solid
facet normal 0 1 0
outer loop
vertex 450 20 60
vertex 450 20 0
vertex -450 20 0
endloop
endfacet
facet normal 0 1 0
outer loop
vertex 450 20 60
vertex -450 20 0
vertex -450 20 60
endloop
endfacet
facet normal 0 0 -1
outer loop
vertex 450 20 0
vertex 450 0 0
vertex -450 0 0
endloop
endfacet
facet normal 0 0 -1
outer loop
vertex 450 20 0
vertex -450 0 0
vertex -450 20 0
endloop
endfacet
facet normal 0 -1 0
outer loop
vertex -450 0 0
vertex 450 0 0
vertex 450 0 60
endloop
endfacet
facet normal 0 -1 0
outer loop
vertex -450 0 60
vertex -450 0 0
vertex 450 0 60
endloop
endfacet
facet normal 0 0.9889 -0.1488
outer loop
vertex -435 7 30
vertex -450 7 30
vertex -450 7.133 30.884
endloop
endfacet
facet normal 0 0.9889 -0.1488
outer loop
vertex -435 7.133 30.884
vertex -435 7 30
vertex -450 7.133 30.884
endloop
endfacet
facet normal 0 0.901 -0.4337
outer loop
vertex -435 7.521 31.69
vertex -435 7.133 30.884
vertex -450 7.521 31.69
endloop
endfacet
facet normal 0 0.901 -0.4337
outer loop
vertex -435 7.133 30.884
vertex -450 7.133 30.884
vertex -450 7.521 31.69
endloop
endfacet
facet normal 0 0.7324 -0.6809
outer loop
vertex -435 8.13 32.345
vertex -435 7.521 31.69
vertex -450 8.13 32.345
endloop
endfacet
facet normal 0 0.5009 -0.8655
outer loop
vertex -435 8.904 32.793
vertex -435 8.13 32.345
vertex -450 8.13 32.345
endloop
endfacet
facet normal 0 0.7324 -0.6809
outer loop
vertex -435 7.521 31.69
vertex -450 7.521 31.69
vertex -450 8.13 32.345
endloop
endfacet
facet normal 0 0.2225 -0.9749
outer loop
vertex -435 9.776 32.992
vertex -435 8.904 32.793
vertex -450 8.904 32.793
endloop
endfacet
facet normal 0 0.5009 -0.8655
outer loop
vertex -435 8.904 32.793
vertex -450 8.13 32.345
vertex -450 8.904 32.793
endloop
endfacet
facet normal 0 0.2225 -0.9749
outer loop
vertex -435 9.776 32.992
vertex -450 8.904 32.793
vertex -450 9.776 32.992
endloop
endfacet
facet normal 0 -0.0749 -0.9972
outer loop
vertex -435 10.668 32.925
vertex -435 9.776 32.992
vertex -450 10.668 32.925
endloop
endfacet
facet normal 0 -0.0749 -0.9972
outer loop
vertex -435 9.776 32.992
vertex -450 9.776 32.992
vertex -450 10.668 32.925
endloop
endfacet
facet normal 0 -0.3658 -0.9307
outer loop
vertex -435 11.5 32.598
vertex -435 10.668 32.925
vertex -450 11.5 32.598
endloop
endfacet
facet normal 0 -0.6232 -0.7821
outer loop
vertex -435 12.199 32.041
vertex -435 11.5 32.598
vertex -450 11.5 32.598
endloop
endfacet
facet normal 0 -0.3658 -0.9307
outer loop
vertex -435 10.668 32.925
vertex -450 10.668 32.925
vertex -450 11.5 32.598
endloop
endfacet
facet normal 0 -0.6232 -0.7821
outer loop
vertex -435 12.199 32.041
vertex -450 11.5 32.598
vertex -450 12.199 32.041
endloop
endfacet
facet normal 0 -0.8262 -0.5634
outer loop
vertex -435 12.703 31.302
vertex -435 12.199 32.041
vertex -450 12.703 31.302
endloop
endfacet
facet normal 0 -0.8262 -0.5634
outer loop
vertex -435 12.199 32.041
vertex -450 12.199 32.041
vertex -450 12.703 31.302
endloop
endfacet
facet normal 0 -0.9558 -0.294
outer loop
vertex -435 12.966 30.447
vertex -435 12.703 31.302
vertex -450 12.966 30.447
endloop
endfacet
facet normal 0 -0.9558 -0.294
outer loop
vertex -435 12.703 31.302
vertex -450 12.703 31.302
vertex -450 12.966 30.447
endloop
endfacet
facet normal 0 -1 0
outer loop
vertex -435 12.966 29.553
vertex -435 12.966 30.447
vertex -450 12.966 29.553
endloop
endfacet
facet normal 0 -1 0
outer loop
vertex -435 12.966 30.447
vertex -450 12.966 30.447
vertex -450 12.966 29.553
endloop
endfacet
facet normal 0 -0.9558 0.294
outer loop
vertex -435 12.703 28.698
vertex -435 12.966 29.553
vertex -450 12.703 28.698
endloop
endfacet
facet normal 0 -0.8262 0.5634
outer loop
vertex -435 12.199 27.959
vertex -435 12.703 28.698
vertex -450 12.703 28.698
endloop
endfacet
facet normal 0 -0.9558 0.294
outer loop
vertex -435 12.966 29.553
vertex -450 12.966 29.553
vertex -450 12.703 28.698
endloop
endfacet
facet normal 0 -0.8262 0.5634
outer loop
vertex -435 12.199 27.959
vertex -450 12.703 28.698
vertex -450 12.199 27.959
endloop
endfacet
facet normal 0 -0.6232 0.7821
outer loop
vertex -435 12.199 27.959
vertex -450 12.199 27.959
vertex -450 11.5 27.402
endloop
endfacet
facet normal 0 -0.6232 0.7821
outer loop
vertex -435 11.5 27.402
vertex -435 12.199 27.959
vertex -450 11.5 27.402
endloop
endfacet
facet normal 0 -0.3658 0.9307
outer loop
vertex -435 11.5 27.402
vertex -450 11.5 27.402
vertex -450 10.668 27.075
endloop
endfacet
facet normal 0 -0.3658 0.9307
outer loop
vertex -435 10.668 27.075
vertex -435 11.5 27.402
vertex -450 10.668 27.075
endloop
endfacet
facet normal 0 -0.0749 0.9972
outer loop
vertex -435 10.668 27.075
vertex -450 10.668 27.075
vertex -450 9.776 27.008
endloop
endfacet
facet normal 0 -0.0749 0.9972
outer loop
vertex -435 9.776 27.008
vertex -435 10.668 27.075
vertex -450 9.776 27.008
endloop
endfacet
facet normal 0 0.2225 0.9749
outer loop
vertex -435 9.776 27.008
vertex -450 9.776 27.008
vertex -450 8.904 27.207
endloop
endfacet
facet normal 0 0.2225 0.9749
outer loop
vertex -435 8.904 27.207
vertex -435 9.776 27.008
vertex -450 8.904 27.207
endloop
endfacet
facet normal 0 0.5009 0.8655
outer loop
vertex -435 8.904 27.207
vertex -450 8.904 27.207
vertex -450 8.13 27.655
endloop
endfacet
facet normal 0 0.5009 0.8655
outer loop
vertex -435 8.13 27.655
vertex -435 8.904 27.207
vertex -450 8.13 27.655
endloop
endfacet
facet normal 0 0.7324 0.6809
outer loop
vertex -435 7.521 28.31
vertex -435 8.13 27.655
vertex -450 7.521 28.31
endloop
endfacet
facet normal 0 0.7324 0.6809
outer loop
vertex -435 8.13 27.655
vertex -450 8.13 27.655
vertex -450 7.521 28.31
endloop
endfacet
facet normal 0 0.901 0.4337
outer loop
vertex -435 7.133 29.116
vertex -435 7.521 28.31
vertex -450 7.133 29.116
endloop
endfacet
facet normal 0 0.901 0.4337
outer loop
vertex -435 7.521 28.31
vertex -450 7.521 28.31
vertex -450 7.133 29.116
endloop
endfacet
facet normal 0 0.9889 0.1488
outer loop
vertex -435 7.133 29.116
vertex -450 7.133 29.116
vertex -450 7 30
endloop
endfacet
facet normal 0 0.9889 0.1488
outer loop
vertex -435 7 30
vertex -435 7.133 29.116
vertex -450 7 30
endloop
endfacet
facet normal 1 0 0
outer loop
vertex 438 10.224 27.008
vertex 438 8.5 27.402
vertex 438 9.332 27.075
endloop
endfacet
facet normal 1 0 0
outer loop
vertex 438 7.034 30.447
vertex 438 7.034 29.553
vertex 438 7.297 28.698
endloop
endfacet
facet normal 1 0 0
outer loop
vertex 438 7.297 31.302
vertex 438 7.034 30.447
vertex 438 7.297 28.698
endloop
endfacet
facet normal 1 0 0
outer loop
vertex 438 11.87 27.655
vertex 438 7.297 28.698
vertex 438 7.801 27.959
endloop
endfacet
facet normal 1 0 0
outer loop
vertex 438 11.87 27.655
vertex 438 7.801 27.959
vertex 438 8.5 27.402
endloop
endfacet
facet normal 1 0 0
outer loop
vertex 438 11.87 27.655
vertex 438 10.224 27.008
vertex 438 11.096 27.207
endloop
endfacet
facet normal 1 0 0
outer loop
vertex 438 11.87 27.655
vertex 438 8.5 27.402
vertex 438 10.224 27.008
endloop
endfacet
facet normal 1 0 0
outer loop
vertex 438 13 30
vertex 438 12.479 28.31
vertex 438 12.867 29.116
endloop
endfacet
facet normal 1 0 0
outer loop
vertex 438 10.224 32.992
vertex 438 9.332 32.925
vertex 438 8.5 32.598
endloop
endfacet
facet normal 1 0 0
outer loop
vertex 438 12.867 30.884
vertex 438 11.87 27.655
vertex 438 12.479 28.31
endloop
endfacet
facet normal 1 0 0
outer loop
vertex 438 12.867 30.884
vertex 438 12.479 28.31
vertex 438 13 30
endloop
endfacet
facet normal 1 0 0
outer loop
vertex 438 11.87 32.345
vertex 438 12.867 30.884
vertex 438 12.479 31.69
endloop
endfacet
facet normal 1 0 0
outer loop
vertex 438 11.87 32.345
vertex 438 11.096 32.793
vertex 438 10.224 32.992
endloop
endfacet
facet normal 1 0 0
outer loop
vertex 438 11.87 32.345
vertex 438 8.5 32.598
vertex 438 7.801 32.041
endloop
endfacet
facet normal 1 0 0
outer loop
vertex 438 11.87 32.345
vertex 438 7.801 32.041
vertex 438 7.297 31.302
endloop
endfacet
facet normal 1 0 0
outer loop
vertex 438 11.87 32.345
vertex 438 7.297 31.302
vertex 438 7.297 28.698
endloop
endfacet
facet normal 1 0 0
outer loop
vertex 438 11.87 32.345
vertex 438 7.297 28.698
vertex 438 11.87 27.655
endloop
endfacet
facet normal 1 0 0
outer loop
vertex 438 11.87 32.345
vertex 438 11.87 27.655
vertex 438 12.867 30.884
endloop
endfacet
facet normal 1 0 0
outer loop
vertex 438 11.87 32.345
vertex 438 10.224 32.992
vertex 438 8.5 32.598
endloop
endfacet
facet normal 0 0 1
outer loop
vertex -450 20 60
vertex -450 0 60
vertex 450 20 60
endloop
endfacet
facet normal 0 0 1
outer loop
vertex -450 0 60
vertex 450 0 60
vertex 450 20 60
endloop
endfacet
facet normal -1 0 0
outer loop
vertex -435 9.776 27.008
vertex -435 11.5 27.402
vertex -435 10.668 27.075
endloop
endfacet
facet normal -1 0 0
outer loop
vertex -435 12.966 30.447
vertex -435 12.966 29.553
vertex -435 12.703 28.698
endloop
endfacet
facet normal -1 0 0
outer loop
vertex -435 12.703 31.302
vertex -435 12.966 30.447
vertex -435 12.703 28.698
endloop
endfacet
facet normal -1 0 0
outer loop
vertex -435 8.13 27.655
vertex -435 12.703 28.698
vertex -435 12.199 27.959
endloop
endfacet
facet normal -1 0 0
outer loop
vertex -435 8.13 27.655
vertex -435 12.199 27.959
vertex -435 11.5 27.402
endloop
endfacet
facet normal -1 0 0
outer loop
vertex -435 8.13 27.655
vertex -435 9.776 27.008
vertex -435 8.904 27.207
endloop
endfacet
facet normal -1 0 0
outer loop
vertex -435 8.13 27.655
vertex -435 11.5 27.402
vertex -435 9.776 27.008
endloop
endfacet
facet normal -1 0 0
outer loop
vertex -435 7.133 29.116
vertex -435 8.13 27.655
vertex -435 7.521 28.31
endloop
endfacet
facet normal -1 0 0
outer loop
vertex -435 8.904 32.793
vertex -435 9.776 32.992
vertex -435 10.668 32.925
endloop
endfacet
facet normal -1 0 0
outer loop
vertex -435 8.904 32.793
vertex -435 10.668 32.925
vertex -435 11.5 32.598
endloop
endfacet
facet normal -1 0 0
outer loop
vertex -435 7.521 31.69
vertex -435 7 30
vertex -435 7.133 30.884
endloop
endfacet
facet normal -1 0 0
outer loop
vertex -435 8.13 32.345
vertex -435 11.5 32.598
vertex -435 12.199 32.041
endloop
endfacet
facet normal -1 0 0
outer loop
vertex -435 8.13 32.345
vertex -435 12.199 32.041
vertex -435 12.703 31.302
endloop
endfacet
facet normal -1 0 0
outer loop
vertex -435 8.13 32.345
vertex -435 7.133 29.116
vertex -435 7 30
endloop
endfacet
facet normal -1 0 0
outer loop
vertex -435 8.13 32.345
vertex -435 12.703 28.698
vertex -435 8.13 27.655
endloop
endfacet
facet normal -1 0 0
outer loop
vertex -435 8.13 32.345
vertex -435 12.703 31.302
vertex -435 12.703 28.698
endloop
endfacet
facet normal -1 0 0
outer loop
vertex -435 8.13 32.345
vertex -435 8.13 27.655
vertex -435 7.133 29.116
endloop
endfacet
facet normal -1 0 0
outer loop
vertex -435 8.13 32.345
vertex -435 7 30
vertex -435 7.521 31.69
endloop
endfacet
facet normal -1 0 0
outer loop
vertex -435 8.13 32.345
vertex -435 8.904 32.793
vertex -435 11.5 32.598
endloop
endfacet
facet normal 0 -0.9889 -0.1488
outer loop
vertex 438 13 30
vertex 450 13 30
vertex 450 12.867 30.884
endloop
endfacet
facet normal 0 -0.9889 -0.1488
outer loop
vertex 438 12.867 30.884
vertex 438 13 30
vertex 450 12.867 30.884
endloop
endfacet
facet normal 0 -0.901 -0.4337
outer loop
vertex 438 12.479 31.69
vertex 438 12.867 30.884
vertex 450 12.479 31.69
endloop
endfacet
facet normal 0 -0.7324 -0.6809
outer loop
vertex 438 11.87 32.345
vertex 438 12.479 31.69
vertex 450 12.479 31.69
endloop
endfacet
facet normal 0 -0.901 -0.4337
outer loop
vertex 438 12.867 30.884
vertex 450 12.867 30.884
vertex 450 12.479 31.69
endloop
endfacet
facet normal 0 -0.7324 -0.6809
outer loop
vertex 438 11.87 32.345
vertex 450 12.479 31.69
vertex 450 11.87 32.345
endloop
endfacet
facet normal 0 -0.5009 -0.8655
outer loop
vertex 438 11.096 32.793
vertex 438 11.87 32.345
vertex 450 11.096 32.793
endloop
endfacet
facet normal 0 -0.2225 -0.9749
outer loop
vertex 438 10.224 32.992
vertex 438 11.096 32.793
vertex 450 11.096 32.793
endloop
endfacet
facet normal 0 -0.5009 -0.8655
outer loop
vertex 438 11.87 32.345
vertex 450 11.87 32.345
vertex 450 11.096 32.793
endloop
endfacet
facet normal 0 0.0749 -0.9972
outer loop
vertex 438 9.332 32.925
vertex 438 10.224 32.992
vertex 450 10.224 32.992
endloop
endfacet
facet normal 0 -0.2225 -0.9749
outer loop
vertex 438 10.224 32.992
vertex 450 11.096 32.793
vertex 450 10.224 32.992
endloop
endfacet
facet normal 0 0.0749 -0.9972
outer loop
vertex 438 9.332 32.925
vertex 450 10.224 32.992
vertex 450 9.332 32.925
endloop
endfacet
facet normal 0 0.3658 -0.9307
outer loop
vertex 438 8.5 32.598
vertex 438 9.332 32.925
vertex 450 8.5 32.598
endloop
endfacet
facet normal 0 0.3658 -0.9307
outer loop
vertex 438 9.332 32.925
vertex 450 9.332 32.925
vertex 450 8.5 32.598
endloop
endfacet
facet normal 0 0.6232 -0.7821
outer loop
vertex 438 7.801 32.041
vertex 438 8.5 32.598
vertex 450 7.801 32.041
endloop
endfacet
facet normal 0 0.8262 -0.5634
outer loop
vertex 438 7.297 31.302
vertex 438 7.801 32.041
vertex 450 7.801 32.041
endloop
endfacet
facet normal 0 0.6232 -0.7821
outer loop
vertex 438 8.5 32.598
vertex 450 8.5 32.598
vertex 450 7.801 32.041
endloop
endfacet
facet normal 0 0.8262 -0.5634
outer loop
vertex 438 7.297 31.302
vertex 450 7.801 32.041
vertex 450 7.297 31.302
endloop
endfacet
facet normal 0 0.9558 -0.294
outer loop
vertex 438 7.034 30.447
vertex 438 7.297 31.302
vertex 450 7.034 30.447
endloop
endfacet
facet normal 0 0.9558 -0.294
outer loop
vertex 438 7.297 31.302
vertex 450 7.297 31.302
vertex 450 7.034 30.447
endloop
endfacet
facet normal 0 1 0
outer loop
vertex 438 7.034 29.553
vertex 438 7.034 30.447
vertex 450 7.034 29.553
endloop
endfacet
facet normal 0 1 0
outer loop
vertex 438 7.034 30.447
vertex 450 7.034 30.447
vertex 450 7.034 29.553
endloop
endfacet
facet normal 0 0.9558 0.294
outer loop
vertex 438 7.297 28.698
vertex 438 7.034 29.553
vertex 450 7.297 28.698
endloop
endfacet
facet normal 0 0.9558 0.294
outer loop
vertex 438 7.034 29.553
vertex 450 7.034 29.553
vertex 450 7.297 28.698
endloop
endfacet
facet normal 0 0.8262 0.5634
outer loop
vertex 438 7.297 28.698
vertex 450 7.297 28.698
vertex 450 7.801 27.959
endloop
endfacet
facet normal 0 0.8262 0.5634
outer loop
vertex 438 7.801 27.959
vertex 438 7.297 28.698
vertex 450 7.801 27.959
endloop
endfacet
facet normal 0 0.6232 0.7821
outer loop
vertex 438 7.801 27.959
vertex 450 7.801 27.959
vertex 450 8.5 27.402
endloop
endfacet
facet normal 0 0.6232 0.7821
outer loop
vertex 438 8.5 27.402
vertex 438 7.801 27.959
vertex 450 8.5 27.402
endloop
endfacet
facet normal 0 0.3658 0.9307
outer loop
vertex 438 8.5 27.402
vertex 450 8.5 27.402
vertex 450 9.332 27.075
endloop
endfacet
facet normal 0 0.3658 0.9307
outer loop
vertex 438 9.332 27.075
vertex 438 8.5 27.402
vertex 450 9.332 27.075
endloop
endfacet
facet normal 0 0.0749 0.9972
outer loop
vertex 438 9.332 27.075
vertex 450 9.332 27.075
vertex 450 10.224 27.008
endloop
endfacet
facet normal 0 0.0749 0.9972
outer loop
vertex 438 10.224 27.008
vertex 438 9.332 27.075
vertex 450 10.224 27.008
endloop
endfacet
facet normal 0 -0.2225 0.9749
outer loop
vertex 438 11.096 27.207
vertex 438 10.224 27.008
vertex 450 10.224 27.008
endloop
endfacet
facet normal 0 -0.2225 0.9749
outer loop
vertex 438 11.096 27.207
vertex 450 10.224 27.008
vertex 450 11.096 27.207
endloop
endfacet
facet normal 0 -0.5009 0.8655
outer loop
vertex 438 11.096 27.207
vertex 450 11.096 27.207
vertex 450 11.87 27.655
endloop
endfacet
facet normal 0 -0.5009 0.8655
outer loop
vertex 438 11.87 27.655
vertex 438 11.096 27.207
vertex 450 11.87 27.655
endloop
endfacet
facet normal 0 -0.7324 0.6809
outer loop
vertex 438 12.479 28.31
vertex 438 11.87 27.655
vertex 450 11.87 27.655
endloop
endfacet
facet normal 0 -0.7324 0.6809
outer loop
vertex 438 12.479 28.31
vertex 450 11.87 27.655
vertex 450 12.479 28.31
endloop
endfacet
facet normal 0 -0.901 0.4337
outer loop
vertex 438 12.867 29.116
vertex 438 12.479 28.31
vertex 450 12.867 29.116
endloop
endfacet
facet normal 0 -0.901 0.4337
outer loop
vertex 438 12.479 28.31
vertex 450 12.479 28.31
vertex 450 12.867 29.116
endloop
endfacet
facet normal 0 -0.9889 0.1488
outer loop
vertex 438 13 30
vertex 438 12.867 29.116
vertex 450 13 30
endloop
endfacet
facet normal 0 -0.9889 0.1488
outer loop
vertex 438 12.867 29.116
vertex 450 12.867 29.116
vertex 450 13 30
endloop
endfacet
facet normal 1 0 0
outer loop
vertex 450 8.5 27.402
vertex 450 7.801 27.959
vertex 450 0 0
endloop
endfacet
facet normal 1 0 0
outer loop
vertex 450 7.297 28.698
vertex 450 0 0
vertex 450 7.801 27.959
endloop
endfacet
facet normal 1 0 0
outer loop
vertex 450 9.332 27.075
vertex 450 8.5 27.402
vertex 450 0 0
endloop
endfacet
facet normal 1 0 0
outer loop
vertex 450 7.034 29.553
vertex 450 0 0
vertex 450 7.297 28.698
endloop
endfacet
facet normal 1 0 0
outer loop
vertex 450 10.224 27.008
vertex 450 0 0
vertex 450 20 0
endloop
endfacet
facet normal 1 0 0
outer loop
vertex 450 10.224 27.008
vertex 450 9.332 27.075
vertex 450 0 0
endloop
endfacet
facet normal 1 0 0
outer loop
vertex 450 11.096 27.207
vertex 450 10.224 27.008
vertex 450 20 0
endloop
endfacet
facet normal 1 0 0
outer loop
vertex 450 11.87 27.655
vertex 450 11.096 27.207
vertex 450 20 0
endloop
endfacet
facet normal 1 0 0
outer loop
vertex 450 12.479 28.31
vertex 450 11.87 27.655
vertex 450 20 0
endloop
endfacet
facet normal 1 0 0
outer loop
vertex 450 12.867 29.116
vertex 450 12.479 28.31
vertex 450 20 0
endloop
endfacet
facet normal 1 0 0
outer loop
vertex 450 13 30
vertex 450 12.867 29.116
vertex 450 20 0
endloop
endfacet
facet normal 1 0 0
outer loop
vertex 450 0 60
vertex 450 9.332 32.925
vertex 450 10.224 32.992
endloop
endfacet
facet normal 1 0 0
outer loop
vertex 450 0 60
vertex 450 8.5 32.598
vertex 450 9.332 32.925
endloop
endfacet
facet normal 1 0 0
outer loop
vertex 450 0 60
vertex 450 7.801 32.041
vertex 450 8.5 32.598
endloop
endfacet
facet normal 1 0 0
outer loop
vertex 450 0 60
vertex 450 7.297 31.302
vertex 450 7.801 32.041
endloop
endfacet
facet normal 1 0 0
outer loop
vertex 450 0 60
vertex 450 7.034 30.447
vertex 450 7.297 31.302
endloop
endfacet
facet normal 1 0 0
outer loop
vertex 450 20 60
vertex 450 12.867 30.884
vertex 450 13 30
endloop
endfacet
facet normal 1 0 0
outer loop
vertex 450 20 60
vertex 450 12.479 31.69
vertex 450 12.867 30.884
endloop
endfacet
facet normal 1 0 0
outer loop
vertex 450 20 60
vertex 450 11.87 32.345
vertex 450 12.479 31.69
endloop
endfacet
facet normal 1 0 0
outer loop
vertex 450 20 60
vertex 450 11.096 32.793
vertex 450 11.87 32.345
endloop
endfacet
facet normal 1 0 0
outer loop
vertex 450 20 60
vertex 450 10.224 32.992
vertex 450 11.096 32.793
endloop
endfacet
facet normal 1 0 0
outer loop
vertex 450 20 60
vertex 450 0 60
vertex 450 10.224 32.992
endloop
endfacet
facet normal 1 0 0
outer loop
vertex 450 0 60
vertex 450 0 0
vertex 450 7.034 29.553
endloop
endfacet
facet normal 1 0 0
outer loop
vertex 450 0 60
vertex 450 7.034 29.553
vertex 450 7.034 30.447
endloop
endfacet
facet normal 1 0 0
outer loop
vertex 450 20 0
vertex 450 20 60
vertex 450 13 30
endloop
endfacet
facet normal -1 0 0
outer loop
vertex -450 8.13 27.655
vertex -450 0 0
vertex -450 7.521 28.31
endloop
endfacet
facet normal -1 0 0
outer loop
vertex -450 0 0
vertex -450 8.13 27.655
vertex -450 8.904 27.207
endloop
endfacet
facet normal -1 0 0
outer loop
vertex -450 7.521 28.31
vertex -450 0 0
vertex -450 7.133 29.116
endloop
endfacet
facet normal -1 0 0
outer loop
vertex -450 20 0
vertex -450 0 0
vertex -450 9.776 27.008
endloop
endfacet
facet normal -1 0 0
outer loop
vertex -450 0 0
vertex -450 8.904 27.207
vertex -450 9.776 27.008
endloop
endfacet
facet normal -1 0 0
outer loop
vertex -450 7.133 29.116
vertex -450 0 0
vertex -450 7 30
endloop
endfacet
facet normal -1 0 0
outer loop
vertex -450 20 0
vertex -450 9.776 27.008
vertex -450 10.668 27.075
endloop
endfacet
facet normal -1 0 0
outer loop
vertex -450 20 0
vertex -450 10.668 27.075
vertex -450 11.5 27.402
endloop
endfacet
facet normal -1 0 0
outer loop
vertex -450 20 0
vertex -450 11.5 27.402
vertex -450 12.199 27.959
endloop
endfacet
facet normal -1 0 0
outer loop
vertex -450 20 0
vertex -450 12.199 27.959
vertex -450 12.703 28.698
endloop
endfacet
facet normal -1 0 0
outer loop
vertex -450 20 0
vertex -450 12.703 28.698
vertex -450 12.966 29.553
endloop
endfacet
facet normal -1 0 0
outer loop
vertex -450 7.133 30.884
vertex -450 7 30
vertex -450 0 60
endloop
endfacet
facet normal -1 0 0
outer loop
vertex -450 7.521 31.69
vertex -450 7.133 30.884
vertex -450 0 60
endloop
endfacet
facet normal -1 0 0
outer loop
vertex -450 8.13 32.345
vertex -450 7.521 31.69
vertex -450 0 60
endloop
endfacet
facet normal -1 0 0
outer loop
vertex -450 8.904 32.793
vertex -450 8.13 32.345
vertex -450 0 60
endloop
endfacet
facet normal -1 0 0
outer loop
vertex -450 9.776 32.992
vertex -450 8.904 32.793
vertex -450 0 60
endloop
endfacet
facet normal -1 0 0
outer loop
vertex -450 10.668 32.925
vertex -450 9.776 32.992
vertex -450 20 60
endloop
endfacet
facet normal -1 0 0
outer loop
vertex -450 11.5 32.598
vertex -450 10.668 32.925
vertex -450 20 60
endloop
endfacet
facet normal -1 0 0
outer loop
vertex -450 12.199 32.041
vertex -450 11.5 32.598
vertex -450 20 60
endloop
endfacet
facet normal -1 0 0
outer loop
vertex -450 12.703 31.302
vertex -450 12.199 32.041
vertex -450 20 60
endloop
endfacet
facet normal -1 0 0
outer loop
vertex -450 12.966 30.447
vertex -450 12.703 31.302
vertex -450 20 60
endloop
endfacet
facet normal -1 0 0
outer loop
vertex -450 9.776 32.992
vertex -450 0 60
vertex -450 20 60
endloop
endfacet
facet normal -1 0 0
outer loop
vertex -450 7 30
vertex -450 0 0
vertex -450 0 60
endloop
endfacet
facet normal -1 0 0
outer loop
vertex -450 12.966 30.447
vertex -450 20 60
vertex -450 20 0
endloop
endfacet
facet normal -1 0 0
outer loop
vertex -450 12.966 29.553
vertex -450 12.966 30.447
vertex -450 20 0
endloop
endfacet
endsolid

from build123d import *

# Parameters (mm, degrees)
F0_W     = 20
F0_H     = 60
F1_DEPTH = 450
F2_R     = 3
F3_DEPTH = 12
F5_R     = 3
F6_DEPTH = 15


with BuildPart() as f1:
    # F0 (on Right) → F1 (new body, symmetric)
    with BuildSketch(Plane.YZ):
        with Locations((10, 30)):
            Rectangle(F0_W, F0_H)
    extrude(amount=F1_DEPTH, both=True)

    # F2 (on face) → F3 (cut)
    with BuildSketch(Plane.YZ.offset(450)):
        with Locations((10, 30)):
            Circle(F2_R)
    extrude(amount=-F3_DEPTH, mode=Mode.SUBTRACT)

    # F5 (on face) → F6 (cut)
    with BuildSketch(Plane(origin=(-450, 0, 0), x_dir=(0, -1, 0), z_dir=(-1, 0, 0))):
        with Locations((-10, 30)):
            Circle(F5_R)
    extrude(amount=-F6_DEPTH, mode=Mode.SUBTRACT)


solid = f1.part
